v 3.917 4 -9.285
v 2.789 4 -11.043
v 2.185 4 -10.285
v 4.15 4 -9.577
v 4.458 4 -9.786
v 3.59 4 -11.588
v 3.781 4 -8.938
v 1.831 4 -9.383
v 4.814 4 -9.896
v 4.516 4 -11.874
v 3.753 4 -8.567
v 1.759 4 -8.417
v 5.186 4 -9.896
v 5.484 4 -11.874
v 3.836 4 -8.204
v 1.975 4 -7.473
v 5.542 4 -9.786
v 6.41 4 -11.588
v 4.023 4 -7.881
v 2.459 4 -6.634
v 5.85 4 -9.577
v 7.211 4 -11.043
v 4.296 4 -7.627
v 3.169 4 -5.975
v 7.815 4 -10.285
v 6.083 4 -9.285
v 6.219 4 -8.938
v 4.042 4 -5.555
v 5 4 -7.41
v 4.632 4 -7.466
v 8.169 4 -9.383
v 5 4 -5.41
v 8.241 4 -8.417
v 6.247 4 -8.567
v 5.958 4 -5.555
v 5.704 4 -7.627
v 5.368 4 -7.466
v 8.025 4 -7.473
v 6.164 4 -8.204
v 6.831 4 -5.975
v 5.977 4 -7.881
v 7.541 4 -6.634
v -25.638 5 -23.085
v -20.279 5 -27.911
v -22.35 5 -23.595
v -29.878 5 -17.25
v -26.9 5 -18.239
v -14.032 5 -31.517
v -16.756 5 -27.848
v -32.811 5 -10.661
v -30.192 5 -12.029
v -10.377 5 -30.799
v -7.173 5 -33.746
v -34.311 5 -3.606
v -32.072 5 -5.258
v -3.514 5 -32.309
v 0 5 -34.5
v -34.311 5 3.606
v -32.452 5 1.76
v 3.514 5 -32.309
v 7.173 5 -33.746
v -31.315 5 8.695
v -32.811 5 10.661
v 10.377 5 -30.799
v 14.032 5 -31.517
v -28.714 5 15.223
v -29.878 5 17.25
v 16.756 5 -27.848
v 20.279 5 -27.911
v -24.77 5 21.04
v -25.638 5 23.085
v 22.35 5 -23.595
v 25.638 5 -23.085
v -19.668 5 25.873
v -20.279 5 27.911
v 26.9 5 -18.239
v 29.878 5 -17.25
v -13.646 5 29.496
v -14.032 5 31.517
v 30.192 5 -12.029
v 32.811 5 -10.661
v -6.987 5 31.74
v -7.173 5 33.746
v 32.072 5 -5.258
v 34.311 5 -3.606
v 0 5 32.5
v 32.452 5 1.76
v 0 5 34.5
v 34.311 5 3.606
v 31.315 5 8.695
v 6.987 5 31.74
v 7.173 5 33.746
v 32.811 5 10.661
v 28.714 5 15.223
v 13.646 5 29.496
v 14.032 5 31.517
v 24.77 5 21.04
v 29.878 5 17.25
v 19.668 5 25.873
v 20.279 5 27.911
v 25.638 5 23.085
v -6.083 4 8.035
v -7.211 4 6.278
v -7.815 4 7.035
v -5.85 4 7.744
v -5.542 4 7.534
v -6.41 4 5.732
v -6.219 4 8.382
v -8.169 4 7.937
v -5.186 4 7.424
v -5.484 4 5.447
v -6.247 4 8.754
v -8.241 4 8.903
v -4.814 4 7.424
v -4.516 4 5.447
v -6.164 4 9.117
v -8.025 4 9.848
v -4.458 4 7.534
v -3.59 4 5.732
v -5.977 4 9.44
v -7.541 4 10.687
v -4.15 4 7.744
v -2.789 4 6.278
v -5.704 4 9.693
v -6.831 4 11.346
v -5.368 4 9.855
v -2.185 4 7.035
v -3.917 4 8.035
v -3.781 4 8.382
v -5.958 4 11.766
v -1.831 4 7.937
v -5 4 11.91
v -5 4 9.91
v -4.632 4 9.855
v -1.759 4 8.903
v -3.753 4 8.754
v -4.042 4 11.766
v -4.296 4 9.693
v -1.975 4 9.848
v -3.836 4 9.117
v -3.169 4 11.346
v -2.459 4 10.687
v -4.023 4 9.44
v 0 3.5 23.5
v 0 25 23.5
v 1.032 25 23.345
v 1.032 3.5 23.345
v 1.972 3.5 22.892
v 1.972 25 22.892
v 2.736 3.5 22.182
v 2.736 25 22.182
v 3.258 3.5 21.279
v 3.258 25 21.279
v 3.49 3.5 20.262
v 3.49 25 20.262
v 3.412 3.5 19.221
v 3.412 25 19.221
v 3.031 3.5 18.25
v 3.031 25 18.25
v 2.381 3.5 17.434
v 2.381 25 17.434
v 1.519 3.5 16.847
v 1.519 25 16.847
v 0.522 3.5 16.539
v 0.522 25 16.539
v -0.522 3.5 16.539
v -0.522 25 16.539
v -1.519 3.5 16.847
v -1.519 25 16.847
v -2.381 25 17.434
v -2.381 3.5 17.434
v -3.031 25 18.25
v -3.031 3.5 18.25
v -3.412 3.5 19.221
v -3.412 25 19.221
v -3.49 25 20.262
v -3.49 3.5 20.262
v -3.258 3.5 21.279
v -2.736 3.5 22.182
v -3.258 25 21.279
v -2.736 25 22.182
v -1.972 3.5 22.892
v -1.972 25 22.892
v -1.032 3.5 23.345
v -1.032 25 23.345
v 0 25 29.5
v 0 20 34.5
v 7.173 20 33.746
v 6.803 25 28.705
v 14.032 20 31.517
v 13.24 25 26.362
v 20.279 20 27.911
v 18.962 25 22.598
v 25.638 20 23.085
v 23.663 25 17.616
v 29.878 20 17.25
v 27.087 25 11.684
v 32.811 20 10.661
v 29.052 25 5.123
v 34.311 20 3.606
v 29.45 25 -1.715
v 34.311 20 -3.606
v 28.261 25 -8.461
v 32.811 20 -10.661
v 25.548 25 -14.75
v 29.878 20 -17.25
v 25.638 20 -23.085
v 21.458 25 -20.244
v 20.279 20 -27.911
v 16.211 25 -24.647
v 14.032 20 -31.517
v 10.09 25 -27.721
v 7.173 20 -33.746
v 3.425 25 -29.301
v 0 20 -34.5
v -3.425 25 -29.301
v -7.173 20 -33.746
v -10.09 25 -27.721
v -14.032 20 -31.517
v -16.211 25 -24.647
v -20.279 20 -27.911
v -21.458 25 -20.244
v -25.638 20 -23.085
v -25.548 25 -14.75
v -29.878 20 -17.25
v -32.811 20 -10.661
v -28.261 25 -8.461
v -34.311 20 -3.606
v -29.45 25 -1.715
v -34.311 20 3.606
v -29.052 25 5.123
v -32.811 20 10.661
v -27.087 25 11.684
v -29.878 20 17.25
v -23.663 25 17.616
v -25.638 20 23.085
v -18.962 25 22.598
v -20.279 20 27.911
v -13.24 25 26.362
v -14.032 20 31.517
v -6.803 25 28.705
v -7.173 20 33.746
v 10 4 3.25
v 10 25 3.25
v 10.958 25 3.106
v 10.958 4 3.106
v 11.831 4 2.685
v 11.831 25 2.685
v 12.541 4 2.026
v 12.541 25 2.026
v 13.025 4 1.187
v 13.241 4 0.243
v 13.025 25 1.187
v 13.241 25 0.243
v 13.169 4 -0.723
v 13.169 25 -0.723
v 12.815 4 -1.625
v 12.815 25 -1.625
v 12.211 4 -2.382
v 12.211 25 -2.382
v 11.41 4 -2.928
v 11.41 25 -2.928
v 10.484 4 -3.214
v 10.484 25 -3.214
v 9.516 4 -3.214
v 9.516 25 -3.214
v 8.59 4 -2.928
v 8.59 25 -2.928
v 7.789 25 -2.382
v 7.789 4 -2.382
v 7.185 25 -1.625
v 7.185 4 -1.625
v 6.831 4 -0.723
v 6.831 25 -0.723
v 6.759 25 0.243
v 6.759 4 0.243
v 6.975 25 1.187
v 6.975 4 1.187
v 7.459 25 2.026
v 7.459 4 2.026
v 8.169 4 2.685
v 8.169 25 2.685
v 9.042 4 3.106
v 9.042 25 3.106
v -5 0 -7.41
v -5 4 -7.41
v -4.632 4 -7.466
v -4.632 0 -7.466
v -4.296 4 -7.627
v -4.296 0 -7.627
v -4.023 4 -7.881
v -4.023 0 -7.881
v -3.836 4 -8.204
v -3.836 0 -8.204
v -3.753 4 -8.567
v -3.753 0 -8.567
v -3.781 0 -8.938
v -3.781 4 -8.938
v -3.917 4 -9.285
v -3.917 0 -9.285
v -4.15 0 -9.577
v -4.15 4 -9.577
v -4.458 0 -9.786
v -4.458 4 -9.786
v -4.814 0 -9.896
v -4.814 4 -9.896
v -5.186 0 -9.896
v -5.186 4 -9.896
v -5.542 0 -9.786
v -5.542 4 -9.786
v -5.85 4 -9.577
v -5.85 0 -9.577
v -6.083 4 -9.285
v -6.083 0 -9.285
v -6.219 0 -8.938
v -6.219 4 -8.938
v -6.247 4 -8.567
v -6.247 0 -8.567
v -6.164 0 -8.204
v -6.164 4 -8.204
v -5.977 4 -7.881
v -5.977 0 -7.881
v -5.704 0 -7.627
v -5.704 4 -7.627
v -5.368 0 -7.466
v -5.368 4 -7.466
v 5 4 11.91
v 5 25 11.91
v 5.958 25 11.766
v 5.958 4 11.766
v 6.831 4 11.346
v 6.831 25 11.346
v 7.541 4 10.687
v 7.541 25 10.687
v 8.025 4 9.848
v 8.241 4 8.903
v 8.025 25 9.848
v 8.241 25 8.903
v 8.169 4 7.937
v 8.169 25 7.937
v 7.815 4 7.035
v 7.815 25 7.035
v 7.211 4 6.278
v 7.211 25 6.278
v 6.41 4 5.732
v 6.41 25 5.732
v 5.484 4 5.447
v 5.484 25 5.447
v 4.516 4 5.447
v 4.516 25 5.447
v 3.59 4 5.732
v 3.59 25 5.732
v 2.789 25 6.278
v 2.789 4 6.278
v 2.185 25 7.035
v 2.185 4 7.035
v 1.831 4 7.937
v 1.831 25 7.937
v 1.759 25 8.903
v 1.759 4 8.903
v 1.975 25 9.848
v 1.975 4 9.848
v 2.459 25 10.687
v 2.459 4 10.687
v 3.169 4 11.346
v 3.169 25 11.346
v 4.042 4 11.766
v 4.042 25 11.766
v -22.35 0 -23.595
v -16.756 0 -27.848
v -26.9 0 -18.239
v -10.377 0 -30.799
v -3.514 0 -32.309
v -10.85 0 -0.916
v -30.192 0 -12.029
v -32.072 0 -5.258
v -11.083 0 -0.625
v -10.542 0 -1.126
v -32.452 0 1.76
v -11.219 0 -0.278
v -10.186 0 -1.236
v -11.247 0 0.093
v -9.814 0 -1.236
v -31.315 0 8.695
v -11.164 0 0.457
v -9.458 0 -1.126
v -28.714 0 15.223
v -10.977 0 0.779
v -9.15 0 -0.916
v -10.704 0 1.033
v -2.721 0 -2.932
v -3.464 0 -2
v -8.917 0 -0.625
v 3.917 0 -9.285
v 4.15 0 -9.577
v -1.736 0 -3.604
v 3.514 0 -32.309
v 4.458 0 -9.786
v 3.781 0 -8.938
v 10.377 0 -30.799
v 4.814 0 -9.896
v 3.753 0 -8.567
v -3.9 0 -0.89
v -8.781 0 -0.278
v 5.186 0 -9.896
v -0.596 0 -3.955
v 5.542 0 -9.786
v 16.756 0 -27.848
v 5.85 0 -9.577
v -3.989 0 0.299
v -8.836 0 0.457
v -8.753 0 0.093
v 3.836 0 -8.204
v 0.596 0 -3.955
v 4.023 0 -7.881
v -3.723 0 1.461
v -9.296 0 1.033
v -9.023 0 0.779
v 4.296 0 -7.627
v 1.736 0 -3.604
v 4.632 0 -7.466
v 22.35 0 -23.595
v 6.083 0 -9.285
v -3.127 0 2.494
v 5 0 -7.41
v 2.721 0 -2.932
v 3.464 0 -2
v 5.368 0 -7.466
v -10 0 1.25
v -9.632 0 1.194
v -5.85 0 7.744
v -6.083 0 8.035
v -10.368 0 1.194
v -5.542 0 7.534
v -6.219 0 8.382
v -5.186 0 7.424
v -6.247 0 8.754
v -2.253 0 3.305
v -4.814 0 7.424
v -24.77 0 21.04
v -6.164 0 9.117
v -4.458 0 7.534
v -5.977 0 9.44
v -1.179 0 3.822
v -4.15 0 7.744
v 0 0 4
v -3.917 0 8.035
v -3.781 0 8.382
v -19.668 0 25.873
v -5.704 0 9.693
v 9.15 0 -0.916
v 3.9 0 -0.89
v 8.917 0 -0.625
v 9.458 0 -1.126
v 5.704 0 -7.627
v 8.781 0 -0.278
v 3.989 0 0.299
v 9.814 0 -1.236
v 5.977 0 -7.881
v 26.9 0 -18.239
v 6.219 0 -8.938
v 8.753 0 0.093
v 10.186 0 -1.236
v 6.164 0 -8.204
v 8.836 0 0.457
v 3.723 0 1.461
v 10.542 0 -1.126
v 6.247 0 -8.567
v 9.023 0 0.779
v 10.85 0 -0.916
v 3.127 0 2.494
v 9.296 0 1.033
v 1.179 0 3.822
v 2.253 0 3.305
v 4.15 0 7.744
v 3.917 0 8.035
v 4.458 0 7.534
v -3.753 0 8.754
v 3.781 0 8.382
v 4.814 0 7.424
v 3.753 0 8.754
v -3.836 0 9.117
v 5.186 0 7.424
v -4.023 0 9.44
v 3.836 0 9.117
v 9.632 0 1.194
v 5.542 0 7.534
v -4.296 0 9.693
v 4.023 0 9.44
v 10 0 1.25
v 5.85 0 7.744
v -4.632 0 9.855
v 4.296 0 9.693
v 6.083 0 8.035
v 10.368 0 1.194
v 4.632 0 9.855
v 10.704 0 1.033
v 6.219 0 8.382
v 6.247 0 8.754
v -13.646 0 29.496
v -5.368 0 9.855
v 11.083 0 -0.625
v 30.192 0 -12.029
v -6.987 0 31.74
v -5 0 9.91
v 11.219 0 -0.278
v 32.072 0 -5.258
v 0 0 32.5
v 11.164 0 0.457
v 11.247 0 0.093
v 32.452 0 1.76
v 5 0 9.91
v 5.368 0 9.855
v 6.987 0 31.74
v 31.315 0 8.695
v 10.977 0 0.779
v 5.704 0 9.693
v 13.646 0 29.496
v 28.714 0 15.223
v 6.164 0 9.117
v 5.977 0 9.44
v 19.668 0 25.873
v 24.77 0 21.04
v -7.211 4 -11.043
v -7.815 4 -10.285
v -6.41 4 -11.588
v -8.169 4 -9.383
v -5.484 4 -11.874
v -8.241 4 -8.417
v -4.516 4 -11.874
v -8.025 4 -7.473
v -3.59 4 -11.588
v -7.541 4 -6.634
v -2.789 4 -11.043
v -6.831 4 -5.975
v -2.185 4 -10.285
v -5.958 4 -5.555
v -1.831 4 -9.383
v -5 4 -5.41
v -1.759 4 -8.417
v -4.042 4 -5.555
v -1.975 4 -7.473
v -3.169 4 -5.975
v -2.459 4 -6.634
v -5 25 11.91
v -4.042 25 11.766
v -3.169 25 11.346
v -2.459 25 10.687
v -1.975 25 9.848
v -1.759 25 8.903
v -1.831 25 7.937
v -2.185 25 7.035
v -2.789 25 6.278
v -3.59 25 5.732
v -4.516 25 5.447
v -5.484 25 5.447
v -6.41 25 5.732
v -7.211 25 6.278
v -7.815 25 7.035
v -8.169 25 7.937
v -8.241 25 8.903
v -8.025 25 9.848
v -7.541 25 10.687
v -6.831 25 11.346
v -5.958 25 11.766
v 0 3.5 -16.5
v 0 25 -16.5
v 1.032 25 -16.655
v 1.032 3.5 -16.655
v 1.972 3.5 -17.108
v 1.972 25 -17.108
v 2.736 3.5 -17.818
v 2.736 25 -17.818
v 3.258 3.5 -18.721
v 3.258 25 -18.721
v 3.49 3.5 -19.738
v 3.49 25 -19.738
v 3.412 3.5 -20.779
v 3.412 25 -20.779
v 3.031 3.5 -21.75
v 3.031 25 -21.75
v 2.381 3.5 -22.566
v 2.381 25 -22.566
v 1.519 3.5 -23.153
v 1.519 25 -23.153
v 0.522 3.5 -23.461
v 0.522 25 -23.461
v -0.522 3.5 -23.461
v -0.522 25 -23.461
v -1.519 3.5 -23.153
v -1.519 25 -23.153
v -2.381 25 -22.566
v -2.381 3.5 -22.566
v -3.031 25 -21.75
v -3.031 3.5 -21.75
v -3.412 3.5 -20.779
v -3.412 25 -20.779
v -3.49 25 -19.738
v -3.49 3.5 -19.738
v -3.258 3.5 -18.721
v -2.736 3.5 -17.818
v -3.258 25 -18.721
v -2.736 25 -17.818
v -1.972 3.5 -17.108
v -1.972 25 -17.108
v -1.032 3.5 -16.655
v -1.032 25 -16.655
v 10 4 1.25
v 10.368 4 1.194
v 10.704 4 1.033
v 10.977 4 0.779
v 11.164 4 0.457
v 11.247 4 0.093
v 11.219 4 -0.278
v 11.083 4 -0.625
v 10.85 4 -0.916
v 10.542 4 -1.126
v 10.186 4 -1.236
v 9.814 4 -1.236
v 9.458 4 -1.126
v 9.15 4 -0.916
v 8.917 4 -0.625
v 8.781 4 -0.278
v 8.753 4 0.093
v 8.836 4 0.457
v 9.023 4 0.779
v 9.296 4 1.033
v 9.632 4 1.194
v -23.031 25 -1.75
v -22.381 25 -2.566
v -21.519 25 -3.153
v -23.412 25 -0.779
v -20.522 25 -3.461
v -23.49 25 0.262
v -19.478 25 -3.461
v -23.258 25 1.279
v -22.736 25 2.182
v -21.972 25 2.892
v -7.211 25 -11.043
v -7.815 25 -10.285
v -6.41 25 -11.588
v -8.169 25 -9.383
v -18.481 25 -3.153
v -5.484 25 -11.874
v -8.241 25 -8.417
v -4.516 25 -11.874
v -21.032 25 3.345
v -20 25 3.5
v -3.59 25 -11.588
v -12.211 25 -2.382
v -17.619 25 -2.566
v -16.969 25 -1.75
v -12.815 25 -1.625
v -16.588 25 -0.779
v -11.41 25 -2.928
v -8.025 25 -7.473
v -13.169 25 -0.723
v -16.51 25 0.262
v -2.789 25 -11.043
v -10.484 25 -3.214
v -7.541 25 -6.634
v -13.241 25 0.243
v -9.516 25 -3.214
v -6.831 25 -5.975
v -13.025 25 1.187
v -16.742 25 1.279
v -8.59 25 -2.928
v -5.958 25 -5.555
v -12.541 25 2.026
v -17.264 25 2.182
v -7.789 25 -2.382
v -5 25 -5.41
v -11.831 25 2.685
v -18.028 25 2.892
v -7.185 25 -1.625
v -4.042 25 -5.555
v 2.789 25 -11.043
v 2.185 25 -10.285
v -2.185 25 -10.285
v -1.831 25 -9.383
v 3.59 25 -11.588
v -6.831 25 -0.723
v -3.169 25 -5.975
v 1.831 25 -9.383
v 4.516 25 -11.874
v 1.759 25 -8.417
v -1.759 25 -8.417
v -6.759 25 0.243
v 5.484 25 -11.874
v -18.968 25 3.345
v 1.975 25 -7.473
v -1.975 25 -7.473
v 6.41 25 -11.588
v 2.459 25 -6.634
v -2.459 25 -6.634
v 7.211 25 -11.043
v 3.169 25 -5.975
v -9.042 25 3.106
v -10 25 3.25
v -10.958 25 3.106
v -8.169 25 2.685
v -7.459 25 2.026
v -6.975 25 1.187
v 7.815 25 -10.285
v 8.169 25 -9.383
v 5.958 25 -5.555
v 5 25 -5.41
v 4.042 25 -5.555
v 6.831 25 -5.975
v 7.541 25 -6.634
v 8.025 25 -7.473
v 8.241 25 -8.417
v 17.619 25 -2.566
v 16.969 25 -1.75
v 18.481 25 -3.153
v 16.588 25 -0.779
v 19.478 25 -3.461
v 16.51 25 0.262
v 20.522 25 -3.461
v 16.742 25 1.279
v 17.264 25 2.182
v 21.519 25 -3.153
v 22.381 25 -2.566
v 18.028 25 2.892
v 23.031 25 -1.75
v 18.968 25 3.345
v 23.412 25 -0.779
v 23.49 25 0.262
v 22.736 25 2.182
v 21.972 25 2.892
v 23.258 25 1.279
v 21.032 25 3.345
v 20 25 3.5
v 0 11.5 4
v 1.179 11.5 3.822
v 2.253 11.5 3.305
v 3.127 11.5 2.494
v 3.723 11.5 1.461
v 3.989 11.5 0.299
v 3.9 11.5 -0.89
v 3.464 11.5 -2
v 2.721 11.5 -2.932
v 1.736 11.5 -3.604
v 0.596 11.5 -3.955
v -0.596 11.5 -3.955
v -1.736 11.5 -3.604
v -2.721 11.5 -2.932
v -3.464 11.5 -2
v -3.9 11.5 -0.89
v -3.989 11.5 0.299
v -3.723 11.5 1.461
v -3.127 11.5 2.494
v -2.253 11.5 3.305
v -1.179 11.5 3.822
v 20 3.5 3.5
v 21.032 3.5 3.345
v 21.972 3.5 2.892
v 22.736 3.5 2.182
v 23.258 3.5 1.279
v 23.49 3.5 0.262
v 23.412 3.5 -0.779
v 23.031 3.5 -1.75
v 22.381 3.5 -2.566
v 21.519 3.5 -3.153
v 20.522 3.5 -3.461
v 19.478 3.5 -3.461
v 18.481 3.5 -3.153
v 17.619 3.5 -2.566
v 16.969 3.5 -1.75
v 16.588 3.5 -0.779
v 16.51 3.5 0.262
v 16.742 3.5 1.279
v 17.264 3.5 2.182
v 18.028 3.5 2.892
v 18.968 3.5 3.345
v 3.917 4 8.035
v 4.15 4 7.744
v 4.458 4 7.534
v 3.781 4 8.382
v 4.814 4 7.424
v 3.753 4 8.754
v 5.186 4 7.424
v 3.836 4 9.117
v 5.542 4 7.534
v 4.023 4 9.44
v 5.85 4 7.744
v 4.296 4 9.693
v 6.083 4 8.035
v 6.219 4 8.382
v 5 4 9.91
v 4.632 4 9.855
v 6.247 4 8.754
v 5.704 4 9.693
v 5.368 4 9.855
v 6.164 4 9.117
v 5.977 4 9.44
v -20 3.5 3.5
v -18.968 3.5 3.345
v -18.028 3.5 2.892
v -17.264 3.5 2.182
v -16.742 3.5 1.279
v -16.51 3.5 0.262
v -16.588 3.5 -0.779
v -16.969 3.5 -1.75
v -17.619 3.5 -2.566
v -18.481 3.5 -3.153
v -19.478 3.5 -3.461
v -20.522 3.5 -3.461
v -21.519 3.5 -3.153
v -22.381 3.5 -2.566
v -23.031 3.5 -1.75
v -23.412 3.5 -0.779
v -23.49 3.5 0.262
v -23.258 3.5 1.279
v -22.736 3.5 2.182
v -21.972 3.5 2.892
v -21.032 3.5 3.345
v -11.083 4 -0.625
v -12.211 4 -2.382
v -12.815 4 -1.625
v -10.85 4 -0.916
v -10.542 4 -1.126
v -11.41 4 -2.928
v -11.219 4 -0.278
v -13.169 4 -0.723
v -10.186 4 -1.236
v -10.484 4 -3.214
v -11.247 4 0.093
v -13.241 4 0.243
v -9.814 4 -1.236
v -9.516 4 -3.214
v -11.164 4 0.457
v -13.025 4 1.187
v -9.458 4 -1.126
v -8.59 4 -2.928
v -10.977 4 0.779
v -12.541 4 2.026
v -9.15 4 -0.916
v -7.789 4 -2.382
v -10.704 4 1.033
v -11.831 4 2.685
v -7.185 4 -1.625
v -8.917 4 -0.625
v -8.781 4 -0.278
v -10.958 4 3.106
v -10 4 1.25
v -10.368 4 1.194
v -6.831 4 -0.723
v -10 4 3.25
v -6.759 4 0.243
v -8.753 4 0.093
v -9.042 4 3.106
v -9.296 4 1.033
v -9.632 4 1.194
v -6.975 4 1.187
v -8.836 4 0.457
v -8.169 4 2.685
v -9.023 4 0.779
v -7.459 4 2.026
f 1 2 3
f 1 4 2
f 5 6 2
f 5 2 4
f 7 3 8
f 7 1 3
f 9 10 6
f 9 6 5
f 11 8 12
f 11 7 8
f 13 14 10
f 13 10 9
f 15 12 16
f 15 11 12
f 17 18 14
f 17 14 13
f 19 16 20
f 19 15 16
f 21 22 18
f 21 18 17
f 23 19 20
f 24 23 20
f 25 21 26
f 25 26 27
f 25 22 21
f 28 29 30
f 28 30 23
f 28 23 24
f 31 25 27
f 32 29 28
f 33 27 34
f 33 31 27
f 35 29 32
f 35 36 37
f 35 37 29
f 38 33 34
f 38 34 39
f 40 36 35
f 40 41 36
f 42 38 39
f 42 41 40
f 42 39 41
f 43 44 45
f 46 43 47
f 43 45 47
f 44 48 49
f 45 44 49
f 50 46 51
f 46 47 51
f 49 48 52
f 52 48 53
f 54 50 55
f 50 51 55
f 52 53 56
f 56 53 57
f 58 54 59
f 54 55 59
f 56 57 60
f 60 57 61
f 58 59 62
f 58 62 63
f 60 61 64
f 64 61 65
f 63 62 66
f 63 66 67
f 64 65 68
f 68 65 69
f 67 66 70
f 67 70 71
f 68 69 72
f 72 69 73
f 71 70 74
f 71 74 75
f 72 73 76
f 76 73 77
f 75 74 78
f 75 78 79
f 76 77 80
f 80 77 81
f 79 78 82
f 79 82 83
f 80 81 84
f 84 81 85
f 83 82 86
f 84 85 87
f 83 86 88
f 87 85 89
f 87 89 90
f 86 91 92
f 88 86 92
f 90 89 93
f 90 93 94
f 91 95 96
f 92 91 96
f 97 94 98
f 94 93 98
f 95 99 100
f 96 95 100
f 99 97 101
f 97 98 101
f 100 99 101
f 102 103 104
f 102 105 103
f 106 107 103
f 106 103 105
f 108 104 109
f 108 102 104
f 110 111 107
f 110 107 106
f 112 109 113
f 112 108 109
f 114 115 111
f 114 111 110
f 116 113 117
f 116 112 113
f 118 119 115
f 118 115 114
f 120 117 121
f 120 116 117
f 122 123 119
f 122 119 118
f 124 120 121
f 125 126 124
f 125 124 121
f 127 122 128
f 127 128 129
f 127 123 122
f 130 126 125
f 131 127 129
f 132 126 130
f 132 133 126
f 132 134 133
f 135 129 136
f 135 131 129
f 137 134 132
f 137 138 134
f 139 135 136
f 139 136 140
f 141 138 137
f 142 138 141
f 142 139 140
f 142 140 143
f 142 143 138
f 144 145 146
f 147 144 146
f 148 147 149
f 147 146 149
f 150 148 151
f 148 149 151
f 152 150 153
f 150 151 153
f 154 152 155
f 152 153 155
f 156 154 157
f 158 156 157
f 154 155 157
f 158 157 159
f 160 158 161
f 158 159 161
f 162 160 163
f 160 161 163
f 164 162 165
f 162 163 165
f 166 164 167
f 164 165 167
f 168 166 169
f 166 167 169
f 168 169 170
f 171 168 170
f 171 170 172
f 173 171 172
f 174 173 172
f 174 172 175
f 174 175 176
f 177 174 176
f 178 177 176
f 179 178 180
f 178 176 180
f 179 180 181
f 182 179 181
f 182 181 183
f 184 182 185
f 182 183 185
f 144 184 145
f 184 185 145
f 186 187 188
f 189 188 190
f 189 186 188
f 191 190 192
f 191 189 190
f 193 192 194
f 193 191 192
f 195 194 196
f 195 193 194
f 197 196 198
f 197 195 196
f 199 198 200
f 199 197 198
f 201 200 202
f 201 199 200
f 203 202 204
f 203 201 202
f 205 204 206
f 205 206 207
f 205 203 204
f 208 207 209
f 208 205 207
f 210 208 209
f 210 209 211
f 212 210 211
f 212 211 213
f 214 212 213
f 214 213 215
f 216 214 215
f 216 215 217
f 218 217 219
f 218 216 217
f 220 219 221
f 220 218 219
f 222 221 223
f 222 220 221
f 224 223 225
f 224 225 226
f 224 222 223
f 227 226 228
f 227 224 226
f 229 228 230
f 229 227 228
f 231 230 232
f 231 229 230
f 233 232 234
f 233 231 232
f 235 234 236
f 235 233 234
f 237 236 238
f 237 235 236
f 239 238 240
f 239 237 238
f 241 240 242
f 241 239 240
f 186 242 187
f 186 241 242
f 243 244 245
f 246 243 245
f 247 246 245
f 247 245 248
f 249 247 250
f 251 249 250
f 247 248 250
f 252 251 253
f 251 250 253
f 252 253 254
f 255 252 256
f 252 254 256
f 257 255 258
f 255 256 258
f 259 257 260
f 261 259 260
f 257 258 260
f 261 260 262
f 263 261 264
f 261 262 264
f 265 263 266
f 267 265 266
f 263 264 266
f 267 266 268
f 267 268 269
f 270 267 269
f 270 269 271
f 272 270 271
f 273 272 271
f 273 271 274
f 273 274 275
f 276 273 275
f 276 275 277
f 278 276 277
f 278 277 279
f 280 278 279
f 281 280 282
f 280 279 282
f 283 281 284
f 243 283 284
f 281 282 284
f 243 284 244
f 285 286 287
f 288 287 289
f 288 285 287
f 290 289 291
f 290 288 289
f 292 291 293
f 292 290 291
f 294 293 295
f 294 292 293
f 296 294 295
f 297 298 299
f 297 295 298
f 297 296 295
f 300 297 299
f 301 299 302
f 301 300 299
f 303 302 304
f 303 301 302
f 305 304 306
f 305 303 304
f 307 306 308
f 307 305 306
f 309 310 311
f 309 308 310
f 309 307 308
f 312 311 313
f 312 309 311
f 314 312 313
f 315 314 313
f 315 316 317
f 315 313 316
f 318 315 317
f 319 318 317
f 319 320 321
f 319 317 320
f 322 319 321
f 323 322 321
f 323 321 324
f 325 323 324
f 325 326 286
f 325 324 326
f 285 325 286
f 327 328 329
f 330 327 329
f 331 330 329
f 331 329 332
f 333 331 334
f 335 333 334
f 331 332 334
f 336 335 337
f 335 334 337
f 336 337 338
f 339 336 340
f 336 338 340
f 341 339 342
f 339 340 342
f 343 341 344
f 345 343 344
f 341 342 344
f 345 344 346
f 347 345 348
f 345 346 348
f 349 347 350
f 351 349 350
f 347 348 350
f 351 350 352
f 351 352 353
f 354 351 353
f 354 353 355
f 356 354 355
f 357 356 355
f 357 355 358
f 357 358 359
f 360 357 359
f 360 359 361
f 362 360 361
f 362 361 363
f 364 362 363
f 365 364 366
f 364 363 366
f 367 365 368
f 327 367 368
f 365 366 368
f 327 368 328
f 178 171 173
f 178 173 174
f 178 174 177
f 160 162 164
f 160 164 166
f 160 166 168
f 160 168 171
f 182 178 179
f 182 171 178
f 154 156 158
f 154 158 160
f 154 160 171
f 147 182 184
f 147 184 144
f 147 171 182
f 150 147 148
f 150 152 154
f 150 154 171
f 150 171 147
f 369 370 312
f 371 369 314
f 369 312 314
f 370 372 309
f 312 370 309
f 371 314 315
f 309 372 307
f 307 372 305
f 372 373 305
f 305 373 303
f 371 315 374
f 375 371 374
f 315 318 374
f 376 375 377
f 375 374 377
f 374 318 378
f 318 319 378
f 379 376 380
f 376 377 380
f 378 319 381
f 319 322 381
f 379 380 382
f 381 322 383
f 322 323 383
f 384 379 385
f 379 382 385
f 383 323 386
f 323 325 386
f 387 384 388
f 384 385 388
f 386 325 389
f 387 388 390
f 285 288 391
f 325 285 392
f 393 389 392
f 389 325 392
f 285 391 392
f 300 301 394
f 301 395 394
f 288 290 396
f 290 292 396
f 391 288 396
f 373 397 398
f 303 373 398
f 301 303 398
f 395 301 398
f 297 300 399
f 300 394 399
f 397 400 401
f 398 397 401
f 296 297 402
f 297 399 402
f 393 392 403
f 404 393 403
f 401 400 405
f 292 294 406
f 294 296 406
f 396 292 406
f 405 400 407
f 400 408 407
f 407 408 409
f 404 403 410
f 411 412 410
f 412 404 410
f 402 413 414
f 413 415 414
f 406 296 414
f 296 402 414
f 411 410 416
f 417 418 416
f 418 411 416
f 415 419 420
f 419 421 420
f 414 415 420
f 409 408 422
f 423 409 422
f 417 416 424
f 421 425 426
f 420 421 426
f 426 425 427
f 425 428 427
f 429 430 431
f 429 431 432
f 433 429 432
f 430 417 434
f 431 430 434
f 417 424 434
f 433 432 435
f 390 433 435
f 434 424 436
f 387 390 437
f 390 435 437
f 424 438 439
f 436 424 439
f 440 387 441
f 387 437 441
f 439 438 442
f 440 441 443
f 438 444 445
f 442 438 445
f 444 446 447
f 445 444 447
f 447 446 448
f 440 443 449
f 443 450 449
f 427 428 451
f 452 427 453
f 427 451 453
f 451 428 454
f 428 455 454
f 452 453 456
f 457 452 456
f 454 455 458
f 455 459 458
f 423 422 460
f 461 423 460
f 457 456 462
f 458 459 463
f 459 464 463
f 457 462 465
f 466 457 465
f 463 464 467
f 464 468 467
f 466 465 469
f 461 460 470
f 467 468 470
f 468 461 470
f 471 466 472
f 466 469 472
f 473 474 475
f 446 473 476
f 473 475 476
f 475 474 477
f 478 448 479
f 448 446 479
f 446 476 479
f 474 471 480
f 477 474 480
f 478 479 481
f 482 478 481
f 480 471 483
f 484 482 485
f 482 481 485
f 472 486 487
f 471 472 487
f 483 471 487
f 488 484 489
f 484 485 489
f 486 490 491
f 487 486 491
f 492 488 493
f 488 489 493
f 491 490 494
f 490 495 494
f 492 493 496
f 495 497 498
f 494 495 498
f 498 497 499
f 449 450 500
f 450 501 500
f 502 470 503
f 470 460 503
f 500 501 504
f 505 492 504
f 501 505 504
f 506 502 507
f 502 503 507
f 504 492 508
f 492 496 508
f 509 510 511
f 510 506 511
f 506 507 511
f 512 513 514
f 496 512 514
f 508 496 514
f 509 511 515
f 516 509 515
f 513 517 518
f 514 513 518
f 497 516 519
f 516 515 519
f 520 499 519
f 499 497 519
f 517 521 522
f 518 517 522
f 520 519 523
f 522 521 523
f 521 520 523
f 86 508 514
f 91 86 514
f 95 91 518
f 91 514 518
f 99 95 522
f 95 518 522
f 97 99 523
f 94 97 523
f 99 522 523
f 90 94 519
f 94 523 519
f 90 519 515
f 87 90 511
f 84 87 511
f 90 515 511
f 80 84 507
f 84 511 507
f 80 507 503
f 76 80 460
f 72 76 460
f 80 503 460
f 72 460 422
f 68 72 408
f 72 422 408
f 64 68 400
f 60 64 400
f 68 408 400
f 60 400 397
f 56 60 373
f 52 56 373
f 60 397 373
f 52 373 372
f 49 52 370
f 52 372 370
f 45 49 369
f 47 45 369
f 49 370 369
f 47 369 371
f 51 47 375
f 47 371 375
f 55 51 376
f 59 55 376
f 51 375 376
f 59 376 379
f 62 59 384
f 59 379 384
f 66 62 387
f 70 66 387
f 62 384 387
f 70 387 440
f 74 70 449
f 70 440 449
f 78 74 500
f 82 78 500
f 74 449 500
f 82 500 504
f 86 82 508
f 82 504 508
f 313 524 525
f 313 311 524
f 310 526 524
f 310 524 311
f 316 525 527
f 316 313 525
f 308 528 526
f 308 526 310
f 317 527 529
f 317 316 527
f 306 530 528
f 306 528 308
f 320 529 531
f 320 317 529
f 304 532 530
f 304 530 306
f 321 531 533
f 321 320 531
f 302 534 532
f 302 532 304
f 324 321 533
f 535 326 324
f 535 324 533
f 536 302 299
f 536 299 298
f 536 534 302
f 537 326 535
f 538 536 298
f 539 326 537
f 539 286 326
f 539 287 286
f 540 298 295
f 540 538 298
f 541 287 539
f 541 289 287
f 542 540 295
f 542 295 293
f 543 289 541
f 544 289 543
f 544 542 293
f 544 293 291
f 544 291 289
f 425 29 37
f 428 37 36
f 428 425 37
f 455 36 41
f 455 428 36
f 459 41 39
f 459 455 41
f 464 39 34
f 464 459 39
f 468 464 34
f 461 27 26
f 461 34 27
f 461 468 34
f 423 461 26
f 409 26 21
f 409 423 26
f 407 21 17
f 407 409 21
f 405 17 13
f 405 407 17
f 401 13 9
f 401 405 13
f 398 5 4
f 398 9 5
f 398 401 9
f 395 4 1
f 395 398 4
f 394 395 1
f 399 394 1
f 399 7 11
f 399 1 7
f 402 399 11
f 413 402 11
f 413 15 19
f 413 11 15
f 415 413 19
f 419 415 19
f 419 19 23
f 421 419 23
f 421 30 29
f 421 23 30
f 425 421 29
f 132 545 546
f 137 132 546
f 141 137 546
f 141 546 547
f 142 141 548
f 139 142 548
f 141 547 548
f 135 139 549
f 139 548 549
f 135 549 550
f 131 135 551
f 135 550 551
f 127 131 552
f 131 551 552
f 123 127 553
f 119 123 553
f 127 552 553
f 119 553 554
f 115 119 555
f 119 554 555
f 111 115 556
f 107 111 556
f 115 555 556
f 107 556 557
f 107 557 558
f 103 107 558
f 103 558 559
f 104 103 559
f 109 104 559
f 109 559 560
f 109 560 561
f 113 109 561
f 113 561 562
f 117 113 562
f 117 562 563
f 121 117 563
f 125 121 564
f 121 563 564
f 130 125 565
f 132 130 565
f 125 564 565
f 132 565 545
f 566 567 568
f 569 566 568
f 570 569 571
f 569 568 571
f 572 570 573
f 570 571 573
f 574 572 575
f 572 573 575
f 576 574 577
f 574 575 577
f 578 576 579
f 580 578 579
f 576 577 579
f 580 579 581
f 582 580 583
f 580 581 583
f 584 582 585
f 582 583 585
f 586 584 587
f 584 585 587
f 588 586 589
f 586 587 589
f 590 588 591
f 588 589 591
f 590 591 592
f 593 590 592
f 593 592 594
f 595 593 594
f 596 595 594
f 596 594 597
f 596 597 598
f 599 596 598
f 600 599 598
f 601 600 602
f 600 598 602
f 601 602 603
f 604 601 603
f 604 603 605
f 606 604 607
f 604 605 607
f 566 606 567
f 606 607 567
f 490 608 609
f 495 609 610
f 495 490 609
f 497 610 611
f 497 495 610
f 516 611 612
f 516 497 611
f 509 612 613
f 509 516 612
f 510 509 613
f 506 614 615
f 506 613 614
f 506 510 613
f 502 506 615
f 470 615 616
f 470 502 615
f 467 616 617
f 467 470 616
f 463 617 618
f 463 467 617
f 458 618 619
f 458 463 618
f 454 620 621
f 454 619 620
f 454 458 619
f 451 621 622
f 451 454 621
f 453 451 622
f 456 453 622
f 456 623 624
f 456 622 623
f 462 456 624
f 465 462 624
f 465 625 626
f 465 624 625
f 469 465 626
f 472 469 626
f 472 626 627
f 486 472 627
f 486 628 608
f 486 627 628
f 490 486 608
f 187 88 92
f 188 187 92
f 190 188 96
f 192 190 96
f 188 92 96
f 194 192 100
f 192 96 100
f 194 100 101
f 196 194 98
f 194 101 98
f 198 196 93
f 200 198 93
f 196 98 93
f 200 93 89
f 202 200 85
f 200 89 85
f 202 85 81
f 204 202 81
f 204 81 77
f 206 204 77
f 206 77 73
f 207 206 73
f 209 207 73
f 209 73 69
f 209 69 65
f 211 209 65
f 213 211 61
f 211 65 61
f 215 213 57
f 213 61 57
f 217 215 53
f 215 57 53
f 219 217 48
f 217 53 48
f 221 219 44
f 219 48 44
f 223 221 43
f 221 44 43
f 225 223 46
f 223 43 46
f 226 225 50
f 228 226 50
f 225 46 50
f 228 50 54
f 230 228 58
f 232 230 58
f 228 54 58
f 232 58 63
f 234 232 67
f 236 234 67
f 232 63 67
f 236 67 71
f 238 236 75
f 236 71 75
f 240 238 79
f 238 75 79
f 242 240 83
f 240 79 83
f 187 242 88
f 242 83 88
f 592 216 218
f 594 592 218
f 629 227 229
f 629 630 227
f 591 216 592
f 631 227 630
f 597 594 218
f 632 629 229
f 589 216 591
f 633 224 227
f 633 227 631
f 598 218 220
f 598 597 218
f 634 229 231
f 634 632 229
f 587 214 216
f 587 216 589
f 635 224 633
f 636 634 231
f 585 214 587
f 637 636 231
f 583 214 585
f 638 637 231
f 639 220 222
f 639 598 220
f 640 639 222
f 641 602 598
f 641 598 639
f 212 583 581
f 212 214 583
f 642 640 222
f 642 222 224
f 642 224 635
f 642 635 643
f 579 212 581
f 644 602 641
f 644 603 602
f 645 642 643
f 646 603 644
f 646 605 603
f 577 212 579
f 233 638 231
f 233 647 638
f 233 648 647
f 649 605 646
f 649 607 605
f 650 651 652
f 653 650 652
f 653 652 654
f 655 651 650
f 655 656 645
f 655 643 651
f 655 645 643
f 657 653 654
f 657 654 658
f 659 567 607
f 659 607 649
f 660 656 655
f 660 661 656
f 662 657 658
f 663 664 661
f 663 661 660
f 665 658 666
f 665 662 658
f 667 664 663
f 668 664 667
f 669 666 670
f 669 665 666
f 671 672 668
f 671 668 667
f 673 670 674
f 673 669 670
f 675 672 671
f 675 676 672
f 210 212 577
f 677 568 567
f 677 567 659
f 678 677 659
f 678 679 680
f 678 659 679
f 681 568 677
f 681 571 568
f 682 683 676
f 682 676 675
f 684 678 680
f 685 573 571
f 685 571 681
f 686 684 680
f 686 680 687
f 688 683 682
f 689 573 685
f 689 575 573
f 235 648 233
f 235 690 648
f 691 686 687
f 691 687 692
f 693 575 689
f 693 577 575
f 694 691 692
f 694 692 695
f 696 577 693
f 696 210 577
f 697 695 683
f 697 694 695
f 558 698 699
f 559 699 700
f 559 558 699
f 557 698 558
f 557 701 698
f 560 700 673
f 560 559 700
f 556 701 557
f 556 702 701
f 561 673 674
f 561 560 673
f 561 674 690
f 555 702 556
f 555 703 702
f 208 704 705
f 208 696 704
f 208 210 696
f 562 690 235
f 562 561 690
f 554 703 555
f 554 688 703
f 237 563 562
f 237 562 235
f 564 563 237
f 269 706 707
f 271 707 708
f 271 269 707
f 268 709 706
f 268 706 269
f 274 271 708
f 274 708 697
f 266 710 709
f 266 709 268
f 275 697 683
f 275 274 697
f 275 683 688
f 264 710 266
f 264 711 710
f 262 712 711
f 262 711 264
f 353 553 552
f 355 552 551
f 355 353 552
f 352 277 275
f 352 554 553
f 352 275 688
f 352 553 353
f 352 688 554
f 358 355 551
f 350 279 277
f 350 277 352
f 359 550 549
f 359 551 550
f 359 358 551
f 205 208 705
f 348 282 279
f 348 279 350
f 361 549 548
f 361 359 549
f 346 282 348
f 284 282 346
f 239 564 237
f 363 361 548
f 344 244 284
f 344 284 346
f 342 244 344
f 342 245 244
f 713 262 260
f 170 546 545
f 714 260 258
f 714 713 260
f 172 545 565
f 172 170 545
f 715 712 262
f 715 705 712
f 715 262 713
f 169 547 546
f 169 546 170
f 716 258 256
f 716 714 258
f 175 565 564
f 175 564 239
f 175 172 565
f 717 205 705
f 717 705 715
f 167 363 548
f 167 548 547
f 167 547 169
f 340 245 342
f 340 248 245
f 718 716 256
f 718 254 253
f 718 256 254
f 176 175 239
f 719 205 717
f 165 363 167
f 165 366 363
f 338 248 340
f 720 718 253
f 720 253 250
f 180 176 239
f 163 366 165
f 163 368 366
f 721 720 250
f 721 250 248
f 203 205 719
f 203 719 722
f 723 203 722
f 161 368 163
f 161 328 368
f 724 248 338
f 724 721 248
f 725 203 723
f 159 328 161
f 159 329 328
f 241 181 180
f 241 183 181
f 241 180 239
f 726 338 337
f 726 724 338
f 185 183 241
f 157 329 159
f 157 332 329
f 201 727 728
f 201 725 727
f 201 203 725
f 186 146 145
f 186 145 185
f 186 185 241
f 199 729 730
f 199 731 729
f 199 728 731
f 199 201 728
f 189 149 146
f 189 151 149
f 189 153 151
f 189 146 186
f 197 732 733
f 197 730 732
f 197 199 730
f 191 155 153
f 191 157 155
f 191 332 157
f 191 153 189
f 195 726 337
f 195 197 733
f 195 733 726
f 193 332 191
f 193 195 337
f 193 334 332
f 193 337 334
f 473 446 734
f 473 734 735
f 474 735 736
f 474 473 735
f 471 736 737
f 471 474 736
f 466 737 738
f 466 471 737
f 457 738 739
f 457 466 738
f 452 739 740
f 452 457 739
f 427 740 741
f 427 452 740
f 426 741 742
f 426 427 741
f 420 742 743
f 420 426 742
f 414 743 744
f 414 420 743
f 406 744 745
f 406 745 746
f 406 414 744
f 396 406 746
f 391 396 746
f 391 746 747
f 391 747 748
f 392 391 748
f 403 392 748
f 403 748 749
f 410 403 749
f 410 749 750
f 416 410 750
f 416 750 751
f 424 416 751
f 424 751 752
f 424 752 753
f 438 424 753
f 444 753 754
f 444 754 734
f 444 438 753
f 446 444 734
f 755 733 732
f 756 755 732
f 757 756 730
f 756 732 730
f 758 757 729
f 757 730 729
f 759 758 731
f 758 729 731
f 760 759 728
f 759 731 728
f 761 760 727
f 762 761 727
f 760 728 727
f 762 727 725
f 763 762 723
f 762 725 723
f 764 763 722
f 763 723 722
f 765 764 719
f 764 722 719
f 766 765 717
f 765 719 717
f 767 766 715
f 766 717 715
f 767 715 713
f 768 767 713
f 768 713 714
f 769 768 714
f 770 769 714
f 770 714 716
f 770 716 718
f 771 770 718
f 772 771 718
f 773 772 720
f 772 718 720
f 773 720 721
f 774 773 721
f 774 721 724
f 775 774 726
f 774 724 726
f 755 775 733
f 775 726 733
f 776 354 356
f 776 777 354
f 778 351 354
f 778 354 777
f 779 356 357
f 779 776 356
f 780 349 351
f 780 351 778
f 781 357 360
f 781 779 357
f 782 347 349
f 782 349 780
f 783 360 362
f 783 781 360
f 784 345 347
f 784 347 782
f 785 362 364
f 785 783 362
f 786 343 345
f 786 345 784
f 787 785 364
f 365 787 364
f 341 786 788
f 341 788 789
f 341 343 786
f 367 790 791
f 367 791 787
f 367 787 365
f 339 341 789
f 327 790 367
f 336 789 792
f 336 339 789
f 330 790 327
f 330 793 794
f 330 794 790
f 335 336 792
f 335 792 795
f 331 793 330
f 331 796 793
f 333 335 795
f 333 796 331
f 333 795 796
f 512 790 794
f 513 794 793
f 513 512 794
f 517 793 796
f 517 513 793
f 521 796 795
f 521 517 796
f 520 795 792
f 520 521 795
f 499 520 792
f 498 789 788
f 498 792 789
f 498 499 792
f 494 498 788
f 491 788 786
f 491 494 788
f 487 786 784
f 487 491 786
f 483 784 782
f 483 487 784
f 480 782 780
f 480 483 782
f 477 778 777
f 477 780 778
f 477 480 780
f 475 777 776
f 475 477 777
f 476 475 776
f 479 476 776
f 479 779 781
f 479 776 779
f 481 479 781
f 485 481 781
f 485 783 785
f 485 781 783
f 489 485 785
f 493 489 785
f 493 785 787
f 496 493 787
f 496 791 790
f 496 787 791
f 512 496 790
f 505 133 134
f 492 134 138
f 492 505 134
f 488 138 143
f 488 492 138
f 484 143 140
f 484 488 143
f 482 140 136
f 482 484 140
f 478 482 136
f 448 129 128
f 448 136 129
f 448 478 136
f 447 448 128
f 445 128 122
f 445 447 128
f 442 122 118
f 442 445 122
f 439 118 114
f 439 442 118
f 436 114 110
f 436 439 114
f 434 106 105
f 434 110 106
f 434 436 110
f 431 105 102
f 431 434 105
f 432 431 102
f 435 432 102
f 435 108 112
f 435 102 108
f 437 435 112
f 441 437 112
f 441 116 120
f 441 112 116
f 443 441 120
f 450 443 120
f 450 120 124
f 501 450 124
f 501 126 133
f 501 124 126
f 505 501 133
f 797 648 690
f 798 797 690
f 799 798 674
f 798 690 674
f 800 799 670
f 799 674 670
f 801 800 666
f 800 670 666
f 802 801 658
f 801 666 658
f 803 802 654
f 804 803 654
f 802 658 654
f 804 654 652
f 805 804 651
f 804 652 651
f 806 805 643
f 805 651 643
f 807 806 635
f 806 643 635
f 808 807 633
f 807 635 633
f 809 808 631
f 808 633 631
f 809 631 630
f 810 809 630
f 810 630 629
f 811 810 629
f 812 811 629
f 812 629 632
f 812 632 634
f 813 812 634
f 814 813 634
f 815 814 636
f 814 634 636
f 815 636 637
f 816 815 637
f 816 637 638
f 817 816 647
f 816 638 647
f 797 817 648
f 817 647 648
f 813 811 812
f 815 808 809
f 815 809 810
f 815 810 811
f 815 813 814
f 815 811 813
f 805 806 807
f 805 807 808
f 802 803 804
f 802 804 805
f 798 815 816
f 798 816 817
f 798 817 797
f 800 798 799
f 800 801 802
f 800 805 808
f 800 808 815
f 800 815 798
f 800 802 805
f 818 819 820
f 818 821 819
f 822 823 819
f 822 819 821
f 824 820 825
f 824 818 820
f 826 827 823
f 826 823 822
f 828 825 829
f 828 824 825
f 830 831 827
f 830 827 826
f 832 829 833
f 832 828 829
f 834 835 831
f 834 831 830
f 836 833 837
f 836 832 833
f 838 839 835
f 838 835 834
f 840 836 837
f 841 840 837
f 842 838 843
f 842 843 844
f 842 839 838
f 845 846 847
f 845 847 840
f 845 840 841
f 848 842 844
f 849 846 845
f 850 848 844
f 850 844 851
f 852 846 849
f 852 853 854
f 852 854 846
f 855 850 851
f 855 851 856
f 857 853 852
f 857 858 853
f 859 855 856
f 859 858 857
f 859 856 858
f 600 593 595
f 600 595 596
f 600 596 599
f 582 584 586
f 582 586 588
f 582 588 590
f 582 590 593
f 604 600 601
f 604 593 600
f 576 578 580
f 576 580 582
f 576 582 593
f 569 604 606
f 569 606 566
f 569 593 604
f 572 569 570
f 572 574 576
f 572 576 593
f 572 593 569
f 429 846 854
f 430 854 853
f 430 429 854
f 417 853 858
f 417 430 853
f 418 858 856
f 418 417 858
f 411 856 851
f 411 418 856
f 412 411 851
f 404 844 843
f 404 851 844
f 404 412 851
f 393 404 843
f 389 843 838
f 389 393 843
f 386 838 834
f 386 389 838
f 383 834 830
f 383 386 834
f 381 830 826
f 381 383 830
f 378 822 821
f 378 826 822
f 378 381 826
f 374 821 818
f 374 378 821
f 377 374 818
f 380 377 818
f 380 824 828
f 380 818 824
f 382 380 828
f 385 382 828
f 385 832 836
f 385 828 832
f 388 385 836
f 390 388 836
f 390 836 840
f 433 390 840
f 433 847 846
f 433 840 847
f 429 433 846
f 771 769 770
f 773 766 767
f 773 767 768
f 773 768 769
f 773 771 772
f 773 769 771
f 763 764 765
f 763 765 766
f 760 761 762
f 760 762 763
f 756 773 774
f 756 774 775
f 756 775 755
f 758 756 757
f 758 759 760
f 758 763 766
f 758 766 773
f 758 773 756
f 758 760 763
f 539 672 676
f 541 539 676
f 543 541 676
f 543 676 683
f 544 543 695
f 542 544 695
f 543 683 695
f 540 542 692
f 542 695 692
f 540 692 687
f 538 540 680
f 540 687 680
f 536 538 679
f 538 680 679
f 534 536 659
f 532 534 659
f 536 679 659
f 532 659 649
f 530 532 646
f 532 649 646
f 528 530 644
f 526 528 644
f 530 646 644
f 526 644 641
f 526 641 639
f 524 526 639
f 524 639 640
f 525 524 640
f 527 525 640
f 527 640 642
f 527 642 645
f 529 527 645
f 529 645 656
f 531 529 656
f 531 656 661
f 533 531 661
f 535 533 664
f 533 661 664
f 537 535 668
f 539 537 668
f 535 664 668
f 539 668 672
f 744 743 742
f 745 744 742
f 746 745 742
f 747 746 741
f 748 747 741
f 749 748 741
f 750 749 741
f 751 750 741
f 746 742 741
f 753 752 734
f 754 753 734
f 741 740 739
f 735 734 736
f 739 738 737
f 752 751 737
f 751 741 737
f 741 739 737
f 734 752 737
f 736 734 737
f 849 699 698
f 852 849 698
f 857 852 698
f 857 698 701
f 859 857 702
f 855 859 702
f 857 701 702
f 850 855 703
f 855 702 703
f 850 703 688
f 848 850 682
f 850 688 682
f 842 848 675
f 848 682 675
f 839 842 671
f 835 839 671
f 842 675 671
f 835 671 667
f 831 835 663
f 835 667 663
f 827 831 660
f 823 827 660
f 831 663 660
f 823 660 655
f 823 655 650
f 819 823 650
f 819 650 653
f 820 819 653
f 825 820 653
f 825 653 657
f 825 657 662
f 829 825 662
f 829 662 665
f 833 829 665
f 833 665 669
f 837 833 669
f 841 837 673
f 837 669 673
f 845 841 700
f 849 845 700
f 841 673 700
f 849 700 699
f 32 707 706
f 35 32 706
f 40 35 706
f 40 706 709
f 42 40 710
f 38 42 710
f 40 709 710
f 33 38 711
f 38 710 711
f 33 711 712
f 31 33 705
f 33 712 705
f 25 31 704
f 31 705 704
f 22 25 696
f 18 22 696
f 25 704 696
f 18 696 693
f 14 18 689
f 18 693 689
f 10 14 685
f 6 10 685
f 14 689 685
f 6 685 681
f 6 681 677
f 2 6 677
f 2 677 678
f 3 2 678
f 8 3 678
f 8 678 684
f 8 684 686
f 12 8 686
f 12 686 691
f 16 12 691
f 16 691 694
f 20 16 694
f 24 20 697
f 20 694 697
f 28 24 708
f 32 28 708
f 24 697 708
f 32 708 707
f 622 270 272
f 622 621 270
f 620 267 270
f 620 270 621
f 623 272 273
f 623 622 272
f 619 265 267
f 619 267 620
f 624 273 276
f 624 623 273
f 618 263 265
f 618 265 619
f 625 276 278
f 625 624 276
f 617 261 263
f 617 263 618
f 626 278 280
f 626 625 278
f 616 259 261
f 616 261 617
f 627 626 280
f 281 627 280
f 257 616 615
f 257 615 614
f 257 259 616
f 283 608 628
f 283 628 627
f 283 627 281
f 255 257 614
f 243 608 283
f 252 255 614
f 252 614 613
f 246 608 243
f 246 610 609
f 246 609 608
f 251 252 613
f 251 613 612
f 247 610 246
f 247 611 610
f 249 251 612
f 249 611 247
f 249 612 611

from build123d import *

# Parameters (mm, degrees)
SKETCH1_R           = 32.5
BOSS_EXTRUDE1_DEPTH = 5
SKETCH3_R           = 34.5
BOSS_EXTRUDE3_DEPTH = 20
SKETCH2_R           = 1.25
SKETCH2_R_2         = 4
CUT_EXTRUDE1_DEPTH  = 11.5
SKETCH4_R           = 3.25
CUT_EXTRUDE2_DEPTH  = 21
SKETCH5_R           = 3.5
CUT_EXTRUDE3_DEPTH  = 21.5
CHAMFER1_SIZE       = 5


with BuildPart() as part:
    # Sketch1 → Boss-Extrude1 (new body)
    with BuildSketch(Plane(origin=(0, 0, 0), x_dir=(1, 0, 0), z_dir=(0, 1, 0))):
        with Locations(Location((0, 0, 0), (0, 0, 270))):
            Circle(SKETCH1_R)
    extrude(amount=BOSS_EXTRUDE1_DEPTH)

    # Sketch3 → Boss-Extrude3 (add)
    with BuildSketch(Plane(origin=(0, 5, 0), x_dir=(1, 0, 0), z_dir=(0, 1, 0))):
        with Locations(Location((0, 0, 0), (0, 0, 270))):
            Circle(SKETCH3_R)
    extrude(amount=BOSS_EXTRUDE3_DEPTH)

    # Sketch2 → Cut-Extrude1 (cut)
    with BuildSketch(Plane(origin=(0, 0, 0), x_dir=(1, 0, 0), z_dir=(0, 1, 0))):
        with Locations(Location((-5, 8.660254038, 0), (0, 0, 270))):
            Circle(SKETCH2_R)
        with Locations(Location((5, 8.660254038, 0), (0, 0, 270))):
            Circle(SKETCH2_R)
        with Locations(Location((10, 0, 0), (0, 0, 270))):
            Circle(SKETCH2_R)
        with Locations(Location((5, -8.660254038, 0), (0, 0, 270))):
            Circle(SKETCH2_R)
        with Locations(Location((-5, -8.660254038, 0), (0, 0, 270))):
            Circle(SKETCH2_R)
        with Locations(Location((-10, 0, 0), (0, 0, 270))):
            Circle(SKETCH2_R)
        with Locations(Location((0, 0, 0), (0, 0, 270))):
            Circle(SKETCH2_R_2)
    extrude(amount=CUT_EXTRUDE1_DEPTH, mode=Mode.SUBTRACT)

    # Sketch4 → Cut-Extrude2 (cut)
    with BuildSketch(Plane(origin=(0, 25, 0), x_dir=(1, 0, 0), z_dir=(0, 1, 0))):
        with Locations(Location((10, 0, 0), (0, 0, 270))):
            Circle(SKETCH4_R)
        with Locations(Location((5, 8.660254038, 0), (0, 0, 270))):
            Circle(SKETCH4_R)
        with Locations(Location((5, -8.660254038, 0), (0, 0, 270))):
            Circle(SKETCH4_R)
        with Locations(Location((-5, -8.660254038, 0), (0, 0, 270))):
            Circle(SKETCH4_R)
        with Locations(Location((-10, 0, 0), (0, 0, 270))):
            Circle(SKETCH4_R)
        with Locations(Location((-5, 8.660254038, 0), (0, 0, 270))):
            Circle(SKETCH4_R)
    extrude(amount=-CUT_EXTRUDE2_DEPTH, mode=Mode.SUBTRACT)

    # Sketch5 → Cut-Extrude3 (cut)
    with BuildSketch(Plane(origin=(0, 25, 0), x_dir=(1, 0, 0), z_dir=(0, 1, 0))):
        with Locations(Location((0, 20, 0), (0, 0, 270))):
            Circle(SKETCH5_R)
        with Locations(Location((20, 0, 0), (0, 0, 270))):
            Circle(SKETCH5_R)
        with Locations(Location((0, -20, 0), (0, 0, 270))):
            Circle(SKETCH5_R)
        with Locations(Location((-20, 0, 0), (0, 0, 270))):
            Circle(SKETCH5_R)
    extrude(amount=-CUT_EXTRUDE3_DEPTH, mode=Mode.SUBTRACT)

    # Chamfer1
    chamfer1_edges = [part.edges().sort_by_distance(p)[0] for p in [
        (0, 25, -34.5),
    ]]
    chamfer(chamfer1_edges, length=CHAMFER1_SIZE)


solid = part.part
